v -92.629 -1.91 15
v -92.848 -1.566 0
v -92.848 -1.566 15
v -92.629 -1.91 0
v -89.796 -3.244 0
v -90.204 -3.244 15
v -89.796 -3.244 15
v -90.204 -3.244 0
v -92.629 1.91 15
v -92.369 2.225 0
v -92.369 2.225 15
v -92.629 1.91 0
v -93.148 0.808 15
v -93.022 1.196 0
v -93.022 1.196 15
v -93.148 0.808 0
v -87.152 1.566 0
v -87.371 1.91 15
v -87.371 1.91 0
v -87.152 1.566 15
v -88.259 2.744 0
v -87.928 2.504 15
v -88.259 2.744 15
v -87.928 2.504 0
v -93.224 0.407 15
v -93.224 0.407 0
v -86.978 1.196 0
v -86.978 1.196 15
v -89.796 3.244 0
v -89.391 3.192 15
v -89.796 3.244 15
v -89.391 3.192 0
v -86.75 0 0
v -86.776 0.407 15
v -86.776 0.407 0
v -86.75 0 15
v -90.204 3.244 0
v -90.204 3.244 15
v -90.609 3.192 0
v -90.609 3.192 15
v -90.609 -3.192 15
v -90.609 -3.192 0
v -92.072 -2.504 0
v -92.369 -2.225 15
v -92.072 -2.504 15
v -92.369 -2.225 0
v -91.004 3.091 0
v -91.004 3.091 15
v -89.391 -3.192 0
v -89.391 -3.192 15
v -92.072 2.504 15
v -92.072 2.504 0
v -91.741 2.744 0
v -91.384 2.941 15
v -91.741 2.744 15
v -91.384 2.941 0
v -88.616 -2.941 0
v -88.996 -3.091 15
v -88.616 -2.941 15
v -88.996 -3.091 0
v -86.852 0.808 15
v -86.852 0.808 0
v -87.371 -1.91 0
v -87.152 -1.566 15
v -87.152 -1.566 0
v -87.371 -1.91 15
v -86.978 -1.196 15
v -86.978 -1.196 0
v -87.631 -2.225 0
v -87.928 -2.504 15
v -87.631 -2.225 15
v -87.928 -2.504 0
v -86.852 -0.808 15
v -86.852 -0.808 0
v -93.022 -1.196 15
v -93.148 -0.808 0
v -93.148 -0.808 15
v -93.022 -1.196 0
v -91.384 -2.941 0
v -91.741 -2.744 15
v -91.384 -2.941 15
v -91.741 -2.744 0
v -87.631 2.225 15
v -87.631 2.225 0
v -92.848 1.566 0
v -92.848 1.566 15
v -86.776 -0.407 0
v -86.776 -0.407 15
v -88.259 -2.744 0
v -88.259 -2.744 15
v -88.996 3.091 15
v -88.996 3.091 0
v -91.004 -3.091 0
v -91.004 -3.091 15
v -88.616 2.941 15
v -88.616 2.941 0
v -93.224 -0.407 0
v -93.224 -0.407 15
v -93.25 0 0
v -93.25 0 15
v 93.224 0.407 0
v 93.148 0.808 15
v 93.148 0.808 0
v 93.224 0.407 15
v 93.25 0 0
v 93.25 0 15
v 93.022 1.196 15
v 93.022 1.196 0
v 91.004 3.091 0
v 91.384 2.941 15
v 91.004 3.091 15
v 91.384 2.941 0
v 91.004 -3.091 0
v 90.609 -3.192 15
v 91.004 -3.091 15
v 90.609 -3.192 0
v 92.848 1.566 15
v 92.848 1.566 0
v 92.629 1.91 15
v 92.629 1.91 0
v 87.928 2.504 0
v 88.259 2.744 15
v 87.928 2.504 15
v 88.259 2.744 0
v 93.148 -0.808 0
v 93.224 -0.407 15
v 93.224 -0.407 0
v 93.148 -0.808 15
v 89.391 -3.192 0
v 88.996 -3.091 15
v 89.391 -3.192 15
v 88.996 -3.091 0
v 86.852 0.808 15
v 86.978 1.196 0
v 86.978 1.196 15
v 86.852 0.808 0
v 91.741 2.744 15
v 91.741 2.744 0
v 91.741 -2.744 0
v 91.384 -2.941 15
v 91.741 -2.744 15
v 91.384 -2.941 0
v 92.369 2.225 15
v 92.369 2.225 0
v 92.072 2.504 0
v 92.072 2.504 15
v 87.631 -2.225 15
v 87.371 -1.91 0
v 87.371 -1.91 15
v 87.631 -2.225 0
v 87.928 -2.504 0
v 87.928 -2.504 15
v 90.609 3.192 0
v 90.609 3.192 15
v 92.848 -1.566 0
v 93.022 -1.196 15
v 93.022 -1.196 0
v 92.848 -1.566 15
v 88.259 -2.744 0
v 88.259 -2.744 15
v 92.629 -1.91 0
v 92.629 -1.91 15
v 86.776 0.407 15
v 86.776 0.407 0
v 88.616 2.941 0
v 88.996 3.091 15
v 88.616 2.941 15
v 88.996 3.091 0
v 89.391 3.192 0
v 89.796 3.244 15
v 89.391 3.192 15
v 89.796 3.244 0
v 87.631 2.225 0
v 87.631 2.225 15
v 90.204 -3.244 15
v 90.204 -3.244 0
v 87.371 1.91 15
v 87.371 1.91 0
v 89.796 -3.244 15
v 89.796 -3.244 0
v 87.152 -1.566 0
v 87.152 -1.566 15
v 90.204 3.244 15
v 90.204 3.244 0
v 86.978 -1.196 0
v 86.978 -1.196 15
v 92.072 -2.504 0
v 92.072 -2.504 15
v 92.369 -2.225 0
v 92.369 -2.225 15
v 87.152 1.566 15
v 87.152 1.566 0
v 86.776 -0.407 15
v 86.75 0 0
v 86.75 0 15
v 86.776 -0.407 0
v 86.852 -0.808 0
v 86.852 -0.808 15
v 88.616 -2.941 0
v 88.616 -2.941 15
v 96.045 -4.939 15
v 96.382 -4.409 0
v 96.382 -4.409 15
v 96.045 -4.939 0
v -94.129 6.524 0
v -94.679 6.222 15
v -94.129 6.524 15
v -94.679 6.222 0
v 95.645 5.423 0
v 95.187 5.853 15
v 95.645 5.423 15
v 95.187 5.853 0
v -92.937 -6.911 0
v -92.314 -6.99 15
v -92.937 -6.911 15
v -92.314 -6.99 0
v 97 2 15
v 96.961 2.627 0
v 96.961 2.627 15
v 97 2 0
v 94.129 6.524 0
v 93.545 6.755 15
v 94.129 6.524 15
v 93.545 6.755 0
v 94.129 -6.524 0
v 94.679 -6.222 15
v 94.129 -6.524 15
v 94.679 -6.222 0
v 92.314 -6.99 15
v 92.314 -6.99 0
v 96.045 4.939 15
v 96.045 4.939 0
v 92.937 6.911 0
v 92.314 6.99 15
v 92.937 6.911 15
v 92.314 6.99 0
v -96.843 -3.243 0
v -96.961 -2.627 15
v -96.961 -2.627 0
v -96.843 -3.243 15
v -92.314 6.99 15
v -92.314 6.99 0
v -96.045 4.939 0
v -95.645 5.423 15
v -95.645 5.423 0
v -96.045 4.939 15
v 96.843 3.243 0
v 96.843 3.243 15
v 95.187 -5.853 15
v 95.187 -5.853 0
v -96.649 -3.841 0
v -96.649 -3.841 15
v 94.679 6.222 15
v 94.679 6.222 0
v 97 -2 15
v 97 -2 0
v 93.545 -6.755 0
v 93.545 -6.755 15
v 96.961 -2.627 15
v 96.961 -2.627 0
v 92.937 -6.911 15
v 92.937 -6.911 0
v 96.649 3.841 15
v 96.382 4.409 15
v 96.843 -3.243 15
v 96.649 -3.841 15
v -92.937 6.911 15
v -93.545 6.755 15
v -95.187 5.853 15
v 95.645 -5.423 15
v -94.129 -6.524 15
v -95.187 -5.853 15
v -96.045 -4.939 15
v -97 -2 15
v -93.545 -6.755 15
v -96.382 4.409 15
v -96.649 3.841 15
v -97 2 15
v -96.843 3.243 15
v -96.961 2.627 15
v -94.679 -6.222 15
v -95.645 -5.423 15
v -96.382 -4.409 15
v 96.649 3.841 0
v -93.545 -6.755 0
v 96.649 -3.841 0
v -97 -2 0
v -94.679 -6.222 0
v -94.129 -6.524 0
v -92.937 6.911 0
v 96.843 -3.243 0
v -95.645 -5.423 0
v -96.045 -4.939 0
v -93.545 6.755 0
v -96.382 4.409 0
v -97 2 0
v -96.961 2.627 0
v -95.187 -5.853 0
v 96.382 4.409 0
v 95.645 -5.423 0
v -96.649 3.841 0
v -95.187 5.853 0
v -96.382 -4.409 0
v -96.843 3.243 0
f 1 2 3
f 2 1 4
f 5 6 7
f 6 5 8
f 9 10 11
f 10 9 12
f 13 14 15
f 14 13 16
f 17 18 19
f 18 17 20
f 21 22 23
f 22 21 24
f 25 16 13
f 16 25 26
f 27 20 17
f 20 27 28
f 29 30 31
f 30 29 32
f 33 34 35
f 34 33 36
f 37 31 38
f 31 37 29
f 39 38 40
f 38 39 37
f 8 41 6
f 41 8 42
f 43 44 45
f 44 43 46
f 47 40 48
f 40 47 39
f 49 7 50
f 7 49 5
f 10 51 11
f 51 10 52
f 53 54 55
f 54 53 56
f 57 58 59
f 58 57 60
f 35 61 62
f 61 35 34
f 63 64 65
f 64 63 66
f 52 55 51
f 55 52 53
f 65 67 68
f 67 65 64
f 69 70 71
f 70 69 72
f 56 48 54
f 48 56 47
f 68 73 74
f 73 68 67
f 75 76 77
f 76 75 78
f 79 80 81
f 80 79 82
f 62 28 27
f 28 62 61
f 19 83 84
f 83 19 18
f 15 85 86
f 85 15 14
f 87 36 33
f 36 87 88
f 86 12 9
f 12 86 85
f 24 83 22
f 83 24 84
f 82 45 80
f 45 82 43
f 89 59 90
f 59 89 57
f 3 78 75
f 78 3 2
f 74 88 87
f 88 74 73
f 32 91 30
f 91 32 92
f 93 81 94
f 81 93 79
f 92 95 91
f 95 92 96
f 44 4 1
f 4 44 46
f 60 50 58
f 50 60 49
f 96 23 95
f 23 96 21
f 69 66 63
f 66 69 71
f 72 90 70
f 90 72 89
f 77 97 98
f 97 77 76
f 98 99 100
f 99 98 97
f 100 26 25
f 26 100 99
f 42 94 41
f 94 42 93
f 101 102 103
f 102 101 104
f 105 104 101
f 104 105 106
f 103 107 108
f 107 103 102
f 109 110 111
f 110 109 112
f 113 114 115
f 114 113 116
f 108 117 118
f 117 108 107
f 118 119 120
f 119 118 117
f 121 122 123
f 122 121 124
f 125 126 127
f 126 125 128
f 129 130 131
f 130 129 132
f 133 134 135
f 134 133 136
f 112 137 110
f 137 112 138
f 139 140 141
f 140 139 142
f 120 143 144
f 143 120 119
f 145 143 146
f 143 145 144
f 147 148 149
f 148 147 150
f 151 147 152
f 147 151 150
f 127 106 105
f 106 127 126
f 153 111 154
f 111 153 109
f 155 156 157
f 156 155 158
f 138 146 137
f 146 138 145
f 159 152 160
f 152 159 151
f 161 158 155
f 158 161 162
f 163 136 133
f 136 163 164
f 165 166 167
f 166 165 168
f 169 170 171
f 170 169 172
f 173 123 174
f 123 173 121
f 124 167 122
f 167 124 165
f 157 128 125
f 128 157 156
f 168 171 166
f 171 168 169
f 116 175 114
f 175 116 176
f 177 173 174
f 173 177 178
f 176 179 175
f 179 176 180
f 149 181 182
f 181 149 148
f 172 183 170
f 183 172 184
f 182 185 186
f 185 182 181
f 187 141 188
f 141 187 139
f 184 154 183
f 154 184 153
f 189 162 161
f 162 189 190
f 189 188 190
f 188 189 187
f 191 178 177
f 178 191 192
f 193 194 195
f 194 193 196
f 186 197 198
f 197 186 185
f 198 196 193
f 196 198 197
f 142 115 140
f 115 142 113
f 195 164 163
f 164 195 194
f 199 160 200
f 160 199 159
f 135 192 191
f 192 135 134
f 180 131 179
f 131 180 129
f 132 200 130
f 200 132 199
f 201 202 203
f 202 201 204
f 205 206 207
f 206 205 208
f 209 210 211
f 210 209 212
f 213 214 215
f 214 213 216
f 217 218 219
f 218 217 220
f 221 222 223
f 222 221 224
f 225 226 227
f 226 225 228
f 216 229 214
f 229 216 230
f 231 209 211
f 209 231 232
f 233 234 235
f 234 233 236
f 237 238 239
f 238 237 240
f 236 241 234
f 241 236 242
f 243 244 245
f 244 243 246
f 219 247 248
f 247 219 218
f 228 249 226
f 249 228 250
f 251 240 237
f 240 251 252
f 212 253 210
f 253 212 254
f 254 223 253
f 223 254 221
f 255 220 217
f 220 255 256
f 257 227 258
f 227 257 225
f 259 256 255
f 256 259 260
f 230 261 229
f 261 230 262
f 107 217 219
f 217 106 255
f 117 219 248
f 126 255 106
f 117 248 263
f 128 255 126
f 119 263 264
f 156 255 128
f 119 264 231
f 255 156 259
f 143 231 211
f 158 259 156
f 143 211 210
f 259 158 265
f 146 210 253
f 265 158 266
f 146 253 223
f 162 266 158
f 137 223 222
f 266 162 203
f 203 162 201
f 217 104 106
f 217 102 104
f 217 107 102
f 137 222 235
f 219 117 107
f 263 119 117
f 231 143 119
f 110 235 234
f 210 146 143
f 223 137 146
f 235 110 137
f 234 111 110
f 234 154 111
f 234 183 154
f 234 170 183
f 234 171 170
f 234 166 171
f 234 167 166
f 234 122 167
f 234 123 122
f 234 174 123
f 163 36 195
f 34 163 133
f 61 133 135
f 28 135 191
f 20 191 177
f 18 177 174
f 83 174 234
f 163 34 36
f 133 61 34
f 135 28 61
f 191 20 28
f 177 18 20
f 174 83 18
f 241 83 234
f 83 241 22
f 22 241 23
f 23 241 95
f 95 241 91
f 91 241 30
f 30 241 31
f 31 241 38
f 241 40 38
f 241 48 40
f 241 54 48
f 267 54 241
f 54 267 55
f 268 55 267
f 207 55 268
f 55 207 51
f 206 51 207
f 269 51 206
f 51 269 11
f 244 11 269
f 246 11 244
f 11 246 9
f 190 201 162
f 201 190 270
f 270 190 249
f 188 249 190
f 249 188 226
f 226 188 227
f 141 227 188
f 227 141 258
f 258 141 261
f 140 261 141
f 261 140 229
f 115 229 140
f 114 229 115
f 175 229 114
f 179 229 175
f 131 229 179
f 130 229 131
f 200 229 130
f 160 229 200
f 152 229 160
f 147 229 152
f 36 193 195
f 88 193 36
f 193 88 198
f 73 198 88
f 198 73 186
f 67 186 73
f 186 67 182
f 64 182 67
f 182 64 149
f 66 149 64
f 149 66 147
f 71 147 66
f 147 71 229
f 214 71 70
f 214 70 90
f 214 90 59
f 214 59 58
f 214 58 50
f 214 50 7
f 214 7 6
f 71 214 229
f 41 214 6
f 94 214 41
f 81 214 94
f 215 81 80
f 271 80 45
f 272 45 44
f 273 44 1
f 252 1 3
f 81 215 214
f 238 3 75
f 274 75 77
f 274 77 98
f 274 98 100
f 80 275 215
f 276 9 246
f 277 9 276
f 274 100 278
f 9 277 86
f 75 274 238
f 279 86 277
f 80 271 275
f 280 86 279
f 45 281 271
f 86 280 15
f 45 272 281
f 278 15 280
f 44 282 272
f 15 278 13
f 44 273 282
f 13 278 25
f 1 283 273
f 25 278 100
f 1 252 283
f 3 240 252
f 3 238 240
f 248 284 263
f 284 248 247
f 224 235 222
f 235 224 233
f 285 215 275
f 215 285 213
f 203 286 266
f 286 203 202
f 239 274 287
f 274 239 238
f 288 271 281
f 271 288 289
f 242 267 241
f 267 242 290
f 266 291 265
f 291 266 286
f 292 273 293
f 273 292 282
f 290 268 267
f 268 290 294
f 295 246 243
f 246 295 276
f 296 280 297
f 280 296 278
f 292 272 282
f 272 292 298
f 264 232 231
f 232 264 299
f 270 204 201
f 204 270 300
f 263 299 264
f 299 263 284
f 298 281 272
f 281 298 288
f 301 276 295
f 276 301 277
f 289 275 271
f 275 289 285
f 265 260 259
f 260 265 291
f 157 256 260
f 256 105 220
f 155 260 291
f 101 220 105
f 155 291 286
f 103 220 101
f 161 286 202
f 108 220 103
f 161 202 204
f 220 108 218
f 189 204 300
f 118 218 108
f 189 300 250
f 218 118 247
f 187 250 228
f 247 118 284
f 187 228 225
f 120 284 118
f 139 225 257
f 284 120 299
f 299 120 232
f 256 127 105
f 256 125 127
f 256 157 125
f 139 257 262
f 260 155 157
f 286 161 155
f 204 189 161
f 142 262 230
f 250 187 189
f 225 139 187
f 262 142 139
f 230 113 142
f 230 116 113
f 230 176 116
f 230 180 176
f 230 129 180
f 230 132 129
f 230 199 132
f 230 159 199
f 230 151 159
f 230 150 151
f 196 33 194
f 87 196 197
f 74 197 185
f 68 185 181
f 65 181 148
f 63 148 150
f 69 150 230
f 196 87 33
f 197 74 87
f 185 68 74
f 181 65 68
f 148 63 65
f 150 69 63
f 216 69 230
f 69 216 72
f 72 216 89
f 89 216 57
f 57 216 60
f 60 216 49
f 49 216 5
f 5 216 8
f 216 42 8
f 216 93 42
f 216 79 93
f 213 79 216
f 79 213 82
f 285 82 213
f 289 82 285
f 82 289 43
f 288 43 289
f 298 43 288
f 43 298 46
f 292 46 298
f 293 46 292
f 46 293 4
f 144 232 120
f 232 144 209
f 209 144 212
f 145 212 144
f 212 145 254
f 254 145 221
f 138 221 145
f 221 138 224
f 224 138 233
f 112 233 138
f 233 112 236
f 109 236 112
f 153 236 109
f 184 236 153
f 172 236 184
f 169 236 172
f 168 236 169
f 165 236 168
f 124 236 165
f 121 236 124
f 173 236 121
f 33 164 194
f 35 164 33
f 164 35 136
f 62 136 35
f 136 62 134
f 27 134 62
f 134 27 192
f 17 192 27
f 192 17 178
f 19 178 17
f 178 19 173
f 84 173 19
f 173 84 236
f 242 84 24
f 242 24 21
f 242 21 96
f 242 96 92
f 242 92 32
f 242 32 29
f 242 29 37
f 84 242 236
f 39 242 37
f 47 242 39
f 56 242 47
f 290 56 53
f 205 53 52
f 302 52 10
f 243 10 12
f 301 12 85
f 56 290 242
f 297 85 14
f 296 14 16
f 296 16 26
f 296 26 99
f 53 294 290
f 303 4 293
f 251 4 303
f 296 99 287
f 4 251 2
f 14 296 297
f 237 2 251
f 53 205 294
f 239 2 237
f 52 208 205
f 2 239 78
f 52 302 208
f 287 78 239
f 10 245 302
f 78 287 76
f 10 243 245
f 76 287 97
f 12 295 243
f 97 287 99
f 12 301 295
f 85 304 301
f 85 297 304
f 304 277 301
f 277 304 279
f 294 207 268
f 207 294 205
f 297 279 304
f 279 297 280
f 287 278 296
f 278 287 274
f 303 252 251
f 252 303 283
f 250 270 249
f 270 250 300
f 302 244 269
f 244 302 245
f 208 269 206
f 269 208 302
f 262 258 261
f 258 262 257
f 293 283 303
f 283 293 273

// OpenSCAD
$fn = 50;


difference() {
	union() {
		hull() {
			translate(v = [-92.0000000000, 2.0000000000, 0]) {
				cylinder(h = 15, r = 5);
			}
			translate(v = [92.0000000000, 2.0000000000, 0]) {
				cylinder(h = 15, r = 5);
			}
			translate(v = [-92.0000000000, -2.0000000000, 0]) {
				cylinder(h = 15, r = 5);
			}
			translate(v = [92.0000000000, -2.0000000000, 0]) {
				cylinder(h = 15, r = 5);
			}
		}
	}
	union() {
		translate(v = [-90.0000000000, 0.0000000000, -100.0000000000]) {
			cylinder(h = 200, r = 3.2500000000);
		}
		translate(v = [-90.0000000000, 0.0000000000, -100.0000000000]) {
			cylinder(h = 200, r = 3.2500000000);
		}
		translate(v = [90.0000000000, 0.0000000000, -100.0000000000]) {
			cylinder(h = 200, r = 3.2500000000);
		}
		translate(v = [90.0000000000, 0.0000000000, -100.0000000000]) {
			cylinder(h = 200, r = 3.2500000000);
		}
	}
}
